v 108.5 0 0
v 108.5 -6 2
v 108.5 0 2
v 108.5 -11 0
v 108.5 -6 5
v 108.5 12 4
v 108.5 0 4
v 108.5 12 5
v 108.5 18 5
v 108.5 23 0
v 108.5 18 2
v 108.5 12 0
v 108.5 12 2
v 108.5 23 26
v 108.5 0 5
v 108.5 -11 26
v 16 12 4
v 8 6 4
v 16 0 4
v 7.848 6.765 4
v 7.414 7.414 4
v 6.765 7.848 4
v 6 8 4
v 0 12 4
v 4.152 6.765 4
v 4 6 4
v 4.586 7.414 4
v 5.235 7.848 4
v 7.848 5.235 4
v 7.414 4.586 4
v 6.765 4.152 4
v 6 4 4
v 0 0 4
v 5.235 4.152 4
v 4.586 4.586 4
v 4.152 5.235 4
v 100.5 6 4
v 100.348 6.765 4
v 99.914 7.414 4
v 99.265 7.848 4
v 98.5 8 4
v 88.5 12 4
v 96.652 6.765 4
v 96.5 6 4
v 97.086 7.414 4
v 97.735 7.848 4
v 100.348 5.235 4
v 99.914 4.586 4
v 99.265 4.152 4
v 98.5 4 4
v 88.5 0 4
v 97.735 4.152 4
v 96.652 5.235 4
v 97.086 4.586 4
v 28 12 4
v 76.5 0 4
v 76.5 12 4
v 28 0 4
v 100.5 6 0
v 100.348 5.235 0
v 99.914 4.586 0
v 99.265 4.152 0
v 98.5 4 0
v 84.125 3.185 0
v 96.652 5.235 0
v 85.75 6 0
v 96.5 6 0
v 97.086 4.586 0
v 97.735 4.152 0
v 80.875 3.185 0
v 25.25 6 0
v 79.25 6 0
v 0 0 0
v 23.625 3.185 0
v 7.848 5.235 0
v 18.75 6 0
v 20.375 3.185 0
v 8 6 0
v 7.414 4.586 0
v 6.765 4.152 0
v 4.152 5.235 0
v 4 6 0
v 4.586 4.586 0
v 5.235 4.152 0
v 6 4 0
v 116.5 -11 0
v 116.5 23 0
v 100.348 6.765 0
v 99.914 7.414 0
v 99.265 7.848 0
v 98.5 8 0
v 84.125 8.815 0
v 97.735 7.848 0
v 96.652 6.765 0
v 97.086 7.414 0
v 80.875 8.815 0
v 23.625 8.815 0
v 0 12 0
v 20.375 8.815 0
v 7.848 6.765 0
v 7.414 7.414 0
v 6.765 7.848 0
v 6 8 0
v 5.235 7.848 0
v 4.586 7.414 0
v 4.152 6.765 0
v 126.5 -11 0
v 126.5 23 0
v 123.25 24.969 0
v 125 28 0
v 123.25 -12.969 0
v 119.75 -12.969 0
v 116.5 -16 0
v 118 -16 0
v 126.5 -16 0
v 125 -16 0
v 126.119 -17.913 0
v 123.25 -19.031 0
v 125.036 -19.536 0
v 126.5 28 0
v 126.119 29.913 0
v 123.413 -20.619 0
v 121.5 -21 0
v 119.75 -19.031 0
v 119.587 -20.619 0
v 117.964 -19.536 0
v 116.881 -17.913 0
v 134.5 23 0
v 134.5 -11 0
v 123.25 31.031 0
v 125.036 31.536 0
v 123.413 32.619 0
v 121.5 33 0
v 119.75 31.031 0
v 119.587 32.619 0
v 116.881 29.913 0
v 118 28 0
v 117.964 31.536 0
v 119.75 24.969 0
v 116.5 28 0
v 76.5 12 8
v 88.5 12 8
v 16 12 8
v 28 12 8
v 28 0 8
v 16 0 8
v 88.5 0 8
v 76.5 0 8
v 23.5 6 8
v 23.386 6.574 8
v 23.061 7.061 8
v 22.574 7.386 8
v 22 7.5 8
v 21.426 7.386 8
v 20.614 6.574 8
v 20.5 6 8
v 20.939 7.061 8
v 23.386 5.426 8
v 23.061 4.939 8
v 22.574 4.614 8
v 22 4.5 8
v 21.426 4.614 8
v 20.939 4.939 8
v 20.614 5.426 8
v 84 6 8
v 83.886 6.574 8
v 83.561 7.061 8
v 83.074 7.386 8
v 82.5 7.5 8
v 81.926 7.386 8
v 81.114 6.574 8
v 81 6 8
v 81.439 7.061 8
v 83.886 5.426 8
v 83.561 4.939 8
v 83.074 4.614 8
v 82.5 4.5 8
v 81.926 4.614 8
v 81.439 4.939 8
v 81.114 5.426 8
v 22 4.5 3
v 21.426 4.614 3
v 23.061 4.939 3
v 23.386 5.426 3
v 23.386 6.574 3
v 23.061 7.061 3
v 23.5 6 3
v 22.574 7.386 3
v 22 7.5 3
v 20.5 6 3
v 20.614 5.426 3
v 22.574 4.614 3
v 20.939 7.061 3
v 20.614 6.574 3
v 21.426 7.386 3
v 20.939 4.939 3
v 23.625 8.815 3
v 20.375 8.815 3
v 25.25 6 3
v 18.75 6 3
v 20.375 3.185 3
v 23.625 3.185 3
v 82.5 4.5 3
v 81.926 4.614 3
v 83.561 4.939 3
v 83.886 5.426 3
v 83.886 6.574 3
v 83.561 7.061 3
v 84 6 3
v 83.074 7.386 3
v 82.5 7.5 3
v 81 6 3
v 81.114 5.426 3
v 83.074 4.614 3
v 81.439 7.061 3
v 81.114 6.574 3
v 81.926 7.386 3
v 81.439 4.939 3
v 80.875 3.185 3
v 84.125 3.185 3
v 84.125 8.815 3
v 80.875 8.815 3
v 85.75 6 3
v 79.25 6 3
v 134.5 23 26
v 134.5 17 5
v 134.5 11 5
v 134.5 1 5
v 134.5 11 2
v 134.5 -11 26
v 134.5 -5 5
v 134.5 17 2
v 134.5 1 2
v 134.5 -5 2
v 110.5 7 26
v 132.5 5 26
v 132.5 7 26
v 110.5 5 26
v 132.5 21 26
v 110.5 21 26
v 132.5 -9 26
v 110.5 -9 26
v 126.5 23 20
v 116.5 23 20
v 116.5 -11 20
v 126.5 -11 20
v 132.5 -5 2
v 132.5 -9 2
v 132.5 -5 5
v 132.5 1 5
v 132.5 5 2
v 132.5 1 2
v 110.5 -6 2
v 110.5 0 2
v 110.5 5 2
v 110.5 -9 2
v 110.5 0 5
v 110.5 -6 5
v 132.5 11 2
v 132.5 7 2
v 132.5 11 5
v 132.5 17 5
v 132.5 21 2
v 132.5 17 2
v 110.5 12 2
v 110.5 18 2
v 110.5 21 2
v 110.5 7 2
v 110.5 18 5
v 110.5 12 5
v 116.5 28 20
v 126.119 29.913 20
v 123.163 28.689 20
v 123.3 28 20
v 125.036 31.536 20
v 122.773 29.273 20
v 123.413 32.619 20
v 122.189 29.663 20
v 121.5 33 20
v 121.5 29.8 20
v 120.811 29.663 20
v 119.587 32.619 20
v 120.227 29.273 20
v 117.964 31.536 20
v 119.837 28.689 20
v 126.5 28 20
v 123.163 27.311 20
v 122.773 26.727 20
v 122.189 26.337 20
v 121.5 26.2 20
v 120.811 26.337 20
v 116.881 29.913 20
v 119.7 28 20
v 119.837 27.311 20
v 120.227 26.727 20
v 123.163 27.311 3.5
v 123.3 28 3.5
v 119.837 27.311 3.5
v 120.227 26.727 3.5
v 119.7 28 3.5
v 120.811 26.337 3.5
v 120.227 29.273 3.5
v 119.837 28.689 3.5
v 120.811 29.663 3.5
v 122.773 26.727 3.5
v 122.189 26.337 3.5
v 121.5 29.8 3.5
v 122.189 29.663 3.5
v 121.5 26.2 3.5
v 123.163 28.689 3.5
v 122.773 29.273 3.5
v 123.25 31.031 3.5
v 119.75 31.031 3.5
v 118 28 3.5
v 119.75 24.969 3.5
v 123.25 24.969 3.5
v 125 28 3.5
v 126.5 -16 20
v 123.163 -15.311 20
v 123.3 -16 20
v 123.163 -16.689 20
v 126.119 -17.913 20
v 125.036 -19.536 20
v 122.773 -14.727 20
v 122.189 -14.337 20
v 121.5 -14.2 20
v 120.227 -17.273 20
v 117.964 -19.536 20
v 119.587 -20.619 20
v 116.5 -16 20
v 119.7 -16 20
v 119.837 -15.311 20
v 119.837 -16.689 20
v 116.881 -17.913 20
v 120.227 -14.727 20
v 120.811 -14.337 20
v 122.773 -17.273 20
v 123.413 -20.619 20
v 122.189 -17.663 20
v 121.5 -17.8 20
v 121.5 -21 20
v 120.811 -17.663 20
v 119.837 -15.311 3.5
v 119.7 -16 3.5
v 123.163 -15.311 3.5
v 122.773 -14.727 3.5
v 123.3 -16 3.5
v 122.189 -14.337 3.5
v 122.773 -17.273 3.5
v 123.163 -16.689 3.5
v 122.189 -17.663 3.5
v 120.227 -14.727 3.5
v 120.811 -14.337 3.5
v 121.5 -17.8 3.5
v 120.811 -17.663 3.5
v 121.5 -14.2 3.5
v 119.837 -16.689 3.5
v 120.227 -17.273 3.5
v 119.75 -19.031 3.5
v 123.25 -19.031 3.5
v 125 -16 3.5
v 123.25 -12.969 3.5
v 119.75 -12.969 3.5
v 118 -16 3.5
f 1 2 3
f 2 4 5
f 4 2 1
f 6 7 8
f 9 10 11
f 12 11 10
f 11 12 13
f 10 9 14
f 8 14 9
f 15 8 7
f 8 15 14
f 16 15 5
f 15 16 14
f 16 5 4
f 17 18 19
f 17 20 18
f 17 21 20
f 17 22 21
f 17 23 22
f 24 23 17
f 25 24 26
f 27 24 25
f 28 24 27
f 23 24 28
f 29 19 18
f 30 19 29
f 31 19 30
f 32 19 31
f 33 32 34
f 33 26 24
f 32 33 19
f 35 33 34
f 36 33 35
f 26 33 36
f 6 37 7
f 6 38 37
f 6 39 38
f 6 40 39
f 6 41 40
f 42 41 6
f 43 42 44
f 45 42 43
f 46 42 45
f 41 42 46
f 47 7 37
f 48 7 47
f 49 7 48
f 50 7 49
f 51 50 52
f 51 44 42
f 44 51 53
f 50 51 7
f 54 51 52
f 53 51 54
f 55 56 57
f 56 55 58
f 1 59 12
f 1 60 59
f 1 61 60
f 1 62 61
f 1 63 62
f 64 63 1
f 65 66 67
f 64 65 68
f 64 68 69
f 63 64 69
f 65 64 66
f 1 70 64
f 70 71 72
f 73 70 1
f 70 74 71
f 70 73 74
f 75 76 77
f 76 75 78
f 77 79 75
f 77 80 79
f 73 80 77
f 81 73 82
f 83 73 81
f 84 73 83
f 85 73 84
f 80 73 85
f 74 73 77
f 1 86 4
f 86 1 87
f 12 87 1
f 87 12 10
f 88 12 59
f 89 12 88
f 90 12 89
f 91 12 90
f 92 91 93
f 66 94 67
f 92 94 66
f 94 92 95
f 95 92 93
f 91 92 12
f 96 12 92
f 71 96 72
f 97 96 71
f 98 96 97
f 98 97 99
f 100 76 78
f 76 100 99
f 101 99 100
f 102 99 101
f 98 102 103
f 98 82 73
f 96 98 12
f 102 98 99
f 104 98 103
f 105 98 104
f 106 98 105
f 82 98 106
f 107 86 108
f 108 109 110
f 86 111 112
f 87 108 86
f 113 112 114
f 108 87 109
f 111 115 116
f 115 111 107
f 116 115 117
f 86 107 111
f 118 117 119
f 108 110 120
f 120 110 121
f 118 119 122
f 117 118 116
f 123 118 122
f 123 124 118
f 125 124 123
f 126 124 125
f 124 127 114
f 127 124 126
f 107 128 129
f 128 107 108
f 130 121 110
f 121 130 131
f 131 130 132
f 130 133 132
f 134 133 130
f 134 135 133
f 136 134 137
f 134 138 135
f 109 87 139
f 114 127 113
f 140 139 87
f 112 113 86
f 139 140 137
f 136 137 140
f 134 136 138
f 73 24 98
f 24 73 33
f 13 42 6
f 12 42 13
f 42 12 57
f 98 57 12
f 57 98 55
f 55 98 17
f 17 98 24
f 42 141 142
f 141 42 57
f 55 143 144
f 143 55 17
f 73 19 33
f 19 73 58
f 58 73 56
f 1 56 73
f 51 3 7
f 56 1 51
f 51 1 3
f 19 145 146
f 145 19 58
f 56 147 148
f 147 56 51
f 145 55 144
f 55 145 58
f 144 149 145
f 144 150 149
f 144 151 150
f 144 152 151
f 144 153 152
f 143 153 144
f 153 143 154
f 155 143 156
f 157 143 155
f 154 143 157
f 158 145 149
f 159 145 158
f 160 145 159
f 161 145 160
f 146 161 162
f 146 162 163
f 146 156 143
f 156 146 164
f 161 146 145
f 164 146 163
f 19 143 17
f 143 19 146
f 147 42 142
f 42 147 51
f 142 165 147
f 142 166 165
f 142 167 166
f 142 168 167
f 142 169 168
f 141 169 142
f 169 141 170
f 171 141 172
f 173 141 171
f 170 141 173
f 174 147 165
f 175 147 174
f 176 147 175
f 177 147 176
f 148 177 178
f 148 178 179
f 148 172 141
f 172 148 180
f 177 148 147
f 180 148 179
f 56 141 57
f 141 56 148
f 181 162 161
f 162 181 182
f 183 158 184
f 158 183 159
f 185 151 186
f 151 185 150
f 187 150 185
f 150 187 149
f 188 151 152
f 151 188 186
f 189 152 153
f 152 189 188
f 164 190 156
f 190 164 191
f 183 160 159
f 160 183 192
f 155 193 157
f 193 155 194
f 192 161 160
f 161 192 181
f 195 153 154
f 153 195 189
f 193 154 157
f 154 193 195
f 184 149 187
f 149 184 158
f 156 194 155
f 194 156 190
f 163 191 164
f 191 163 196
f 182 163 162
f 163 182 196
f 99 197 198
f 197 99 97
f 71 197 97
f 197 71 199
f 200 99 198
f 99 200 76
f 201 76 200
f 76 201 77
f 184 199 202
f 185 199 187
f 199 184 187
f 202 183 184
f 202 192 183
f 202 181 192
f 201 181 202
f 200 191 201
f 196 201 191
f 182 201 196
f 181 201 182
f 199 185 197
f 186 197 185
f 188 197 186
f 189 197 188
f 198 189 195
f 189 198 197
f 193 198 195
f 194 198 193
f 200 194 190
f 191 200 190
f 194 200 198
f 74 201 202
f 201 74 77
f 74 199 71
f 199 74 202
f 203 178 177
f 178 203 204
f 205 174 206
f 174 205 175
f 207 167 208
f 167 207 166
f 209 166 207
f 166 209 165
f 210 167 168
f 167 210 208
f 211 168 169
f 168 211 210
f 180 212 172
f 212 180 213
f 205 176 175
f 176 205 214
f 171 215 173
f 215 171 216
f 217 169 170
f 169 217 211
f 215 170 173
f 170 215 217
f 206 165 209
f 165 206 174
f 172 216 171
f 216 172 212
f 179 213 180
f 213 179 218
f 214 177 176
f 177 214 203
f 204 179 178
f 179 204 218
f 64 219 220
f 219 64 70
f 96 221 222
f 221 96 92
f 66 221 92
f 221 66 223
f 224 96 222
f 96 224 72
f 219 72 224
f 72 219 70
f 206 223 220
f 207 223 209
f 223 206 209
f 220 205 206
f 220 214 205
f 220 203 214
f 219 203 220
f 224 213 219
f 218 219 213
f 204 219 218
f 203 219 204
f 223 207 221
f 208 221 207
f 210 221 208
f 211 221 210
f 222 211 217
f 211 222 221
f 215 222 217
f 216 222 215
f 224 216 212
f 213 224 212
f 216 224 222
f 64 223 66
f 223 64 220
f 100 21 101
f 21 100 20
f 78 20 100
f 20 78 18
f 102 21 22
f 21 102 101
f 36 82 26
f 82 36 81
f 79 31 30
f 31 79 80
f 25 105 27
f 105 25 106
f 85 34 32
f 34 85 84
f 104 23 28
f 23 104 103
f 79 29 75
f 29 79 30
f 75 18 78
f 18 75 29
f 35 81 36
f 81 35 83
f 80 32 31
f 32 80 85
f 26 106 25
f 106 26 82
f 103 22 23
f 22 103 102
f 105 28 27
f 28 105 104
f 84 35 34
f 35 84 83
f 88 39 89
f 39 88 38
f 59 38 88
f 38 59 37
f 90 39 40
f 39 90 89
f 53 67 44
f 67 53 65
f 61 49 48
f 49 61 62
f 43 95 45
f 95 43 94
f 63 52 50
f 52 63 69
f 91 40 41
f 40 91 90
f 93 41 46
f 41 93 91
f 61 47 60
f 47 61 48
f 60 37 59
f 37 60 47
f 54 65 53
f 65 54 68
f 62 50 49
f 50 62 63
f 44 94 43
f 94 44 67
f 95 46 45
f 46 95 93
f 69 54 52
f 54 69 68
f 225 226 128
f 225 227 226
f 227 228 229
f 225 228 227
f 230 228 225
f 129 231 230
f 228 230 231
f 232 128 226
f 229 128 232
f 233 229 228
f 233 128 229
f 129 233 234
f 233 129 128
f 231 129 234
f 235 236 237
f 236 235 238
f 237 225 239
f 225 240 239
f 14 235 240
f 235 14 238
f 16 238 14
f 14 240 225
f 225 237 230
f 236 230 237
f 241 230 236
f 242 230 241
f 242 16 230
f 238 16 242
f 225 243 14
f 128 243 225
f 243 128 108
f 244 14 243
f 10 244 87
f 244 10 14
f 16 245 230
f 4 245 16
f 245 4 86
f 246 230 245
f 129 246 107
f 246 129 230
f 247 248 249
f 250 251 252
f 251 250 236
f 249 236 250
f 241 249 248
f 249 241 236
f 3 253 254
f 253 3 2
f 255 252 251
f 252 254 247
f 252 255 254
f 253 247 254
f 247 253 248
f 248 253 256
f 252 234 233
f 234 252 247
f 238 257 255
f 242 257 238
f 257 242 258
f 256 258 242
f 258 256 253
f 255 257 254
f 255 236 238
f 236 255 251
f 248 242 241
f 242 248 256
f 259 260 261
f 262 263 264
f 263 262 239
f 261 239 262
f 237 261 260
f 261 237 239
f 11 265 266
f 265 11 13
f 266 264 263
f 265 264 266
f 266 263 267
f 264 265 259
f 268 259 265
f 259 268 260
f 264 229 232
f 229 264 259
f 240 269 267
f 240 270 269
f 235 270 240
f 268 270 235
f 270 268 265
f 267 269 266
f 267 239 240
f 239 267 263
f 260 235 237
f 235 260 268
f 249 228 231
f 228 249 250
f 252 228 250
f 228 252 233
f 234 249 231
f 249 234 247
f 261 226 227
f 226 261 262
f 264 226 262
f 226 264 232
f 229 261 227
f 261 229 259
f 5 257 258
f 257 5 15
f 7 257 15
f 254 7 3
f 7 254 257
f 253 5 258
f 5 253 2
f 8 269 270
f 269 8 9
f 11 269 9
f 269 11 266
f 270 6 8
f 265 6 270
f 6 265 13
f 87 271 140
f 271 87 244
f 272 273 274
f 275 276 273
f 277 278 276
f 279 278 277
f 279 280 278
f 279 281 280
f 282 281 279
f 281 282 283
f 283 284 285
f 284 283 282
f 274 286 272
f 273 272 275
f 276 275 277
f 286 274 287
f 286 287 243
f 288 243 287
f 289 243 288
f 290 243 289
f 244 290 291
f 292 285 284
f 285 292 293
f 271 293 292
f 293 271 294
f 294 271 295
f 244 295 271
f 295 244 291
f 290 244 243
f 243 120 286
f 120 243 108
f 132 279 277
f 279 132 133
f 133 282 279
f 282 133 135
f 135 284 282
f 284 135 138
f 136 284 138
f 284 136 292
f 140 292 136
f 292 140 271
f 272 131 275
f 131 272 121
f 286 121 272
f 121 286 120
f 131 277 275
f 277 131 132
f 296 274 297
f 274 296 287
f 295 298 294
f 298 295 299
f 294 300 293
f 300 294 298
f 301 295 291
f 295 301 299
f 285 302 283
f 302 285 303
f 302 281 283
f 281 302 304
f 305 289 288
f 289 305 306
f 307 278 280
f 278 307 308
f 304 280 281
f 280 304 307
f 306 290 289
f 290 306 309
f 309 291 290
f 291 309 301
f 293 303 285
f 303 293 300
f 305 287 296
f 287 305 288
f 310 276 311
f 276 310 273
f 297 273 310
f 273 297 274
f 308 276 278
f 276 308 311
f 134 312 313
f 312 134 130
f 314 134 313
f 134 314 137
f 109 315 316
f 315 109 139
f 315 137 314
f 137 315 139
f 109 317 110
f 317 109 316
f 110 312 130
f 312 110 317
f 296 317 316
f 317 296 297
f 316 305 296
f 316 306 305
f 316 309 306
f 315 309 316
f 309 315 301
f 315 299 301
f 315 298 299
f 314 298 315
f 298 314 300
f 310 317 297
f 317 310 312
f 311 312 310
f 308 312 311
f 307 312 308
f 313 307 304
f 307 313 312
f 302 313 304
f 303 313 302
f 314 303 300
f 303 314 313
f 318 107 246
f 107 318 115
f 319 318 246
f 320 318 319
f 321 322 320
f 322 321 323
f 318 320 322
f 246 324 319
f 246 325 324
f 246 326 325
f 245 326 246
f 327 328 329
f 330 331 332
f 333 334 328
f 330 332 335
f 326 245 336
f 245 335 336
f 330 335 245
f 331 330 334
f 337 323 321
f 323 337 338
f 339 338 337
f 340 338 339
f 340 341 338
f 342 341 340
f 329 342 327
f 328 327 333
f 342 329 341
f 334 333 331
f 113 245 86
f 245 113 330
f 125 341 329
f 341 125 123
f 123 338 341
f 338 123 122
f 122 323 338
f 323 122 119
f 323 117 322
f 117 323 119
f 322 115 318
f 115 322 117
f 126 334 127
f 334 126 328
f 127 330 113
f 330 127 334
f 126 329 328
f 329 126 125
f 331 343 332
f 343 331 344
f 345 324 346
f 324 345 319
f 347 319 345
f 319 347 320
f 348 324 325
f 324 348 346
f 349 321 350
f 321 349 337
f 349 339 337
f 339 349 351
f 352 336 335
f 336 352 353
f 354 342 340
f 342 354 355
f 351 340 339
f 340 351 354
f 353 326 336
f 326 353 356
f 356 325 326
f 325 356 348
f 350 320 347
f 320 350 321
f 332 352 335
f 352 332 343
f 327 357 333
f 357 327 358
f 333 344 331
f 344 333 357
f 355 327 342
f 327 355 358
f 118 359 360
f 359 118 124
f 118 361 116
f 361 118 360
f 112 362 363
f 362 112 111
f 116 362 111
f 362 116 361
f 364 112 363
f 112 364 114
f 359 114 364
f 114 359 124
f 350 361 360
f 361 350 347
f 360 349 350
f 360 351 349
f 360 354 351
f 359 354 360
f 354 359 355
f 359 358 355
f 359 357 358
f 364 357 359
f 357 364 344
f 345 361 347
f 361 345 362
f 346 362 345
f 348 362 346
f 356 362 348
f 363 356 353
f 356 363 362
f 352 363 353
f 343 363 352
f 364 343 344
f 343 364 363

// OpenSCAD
// file: SwitchHolderVars.scad
switchLength=22;
switchWidth=14;

height=24;
thickness=2;

innerLength=switchLength;
innerWidth=2*switchWidth+thickness;

outerLength=innerLength+2*thickness;
outerWidth=innerWidth+2*thickness;
totalHeight=height+thickness;

batteryHolderWidth=12;
batteryHolderThickness=4;
batteryHolderHeight=8;

screwHolderLength=12;
spaceBetweenScrews=60.5;
offsetFromScrews=10;
spaceBetweenSwitch=4;
firstScrewOffset=screwHolderLength+offsetFromScrews-batteryHolderWidth/2;
batteryHolderTotalLength=spaceBetweenScrews+2*offsetFromScrews+2*screwHolderLength+spaceBetweenSwitch;

nutM3HolderDiameter=10;
nutM3HolderRadius=nutM3HolderDiameter/2;
nutM3HolderDifferenceHeight=6;
nutM3HolderHeight=totalHeight-nutM3HolderDifferenceHeight;

wireWidth=6;
wireHeight=3;

//http://g02.a.alicdn.com/kf/UT82xCDXo8XXXagOFbXu/111613040/UT82xCDXo8XXXagOFbXu.jpg
nutM25Diameter=5.45+1.05;
nutM25Height=2+1.0;
screwM25Diameter=3;

nutM3Diameter=6+1;
nutM3Height=2.4+1.1;
screwM3Diameter=3.6;
screwM3HeadDiameter=5+1;
screwM3HeadHeight=3;

screwM4Diameter=4;

// Cover
switchHoleWidth=12.9+0.6;
switchHoleLength=19.2+0.8;

space=0.4;
coverInnerLength=outerLength+2*space;
coverInnerWidth=outerWidth+2*space;
coverOutsideLength=coverInnerLength+2*thickness;
coverOutsideWidth=coverInnerWidth+2*thickness;
coverHeight=2;
coverTotalHeight=thickness+coverHeight;
coverBorder=space+thickness;
coverOutsideScrewHolderHeight=nutM3HolderDifferenceHeight+thickness;
// main file
include<SwitchHolderVars.scad>;

module switchHolder()
{
	translate([batteryHolderTotalLength,batteryHolderWidth/2-outerWidth/2,0])
	difference()
	{
		cube([outerLength,outerWidth,totalHeight]);
		
		translate([thickness,thickness,thickness])
		cube([switchLength,switchWidth,height+1]);
		
		translate([thickness,2*thickness+switchWidth,thickness])
		cube([switchLength,switchWidth,height+1]);
		
		translate([thickness+switchLength-1,thickness+switchWidth/2-wireWidth/2,thickness])
		cube([thickness+2,wireWidth,wireHeight]);
		
		translate([thickness+switchLength-1,2*thickness+3*switchWidth/2-wireWidth/2,thickness])
		cube([thickness+2,wireWidth,wireHeight]);
		
		translate([-1,outerWidth/2-batteryHolderWidth/2-wireWidth,thickness])
		cube([thickness+2,wireWidth,wireHeight]);
		
		translate([-1,outerWidth/2+batteryHolderWidth/2,thickness])
		cube([thickness+2,wireWidth,wireHeight]);
	}
}

module screwM3Holder(bottom)
{
	yTranslate=batteryHolderWidth/2+(bottom?-1:1)*(outerWidth/2+nutM3HolderRadius);
	translate([batteryHolderTotalLength+outerLength/2,yTranslate,0])
	rotate([0,0,bottom?0:180])
	difference()
	{
		union()
		{
			translate([-nutM3HolderRadius,0,0])
			cube([nutM3HolderDiameter,nutM3HolderRadius,nutM3HolderHeight]);
			
			cylinder(d=nutM3HolderDiameter,h=nutM3HolderHeight,$fn=16);
		}
		
		translate([0,0,-1])
		cylinder(d=screwM3Diameter,h=nutM3HolderHeight+2,$fn=16);
		
		translate([0,0,-1])
		cylinder(d=nutM3Diameter,h=nutM3Height+1,$fn=6);
	}
}

module batteryHolder()
{
	difference()
	{
		union()
		{
			cube([batteryHolderTotalLength,batteryHolderWidth,batteryHolderThickness]);
			
			translate([firstScrewOffset,0,0])
			cube([batteryHolderWidth,batteryHolderWidth,batteryHolderHeight]);
			
			translate([firstScrewOffset+spaceBetweenScrews,0,0])
			cube([batteryHolderWidth,batteryHolderWidth,batteryHolderHeight]);
		}
		
		for(t=[0,spaceBetweenScrews])
		{
			x=screwHolderLength+offsetFromScrews+t;
			y=batteryHolderWidth/2;
			
			translate([x,y,-1])
			cylinder(d=screwM25Diameter,h=batteryHolderHeight+2,$fn=16);
			
			translate([x,y,-1])
			cylinder(d=nutM25Diameter,h=nutM25Height+1,$fn=6);
		}
		
		for(x=[screwHolderLength/2,batteryHolderTotalLength-screwHolderLength/2-spaceBetweenSwitch])
		{
			translate([x,batteryHolderWidth/2,-1])
			cylinder(d=screwM4Diameter,h=batteryHolderThickness+2,$fn=16);
		}
	}
}

union()
{
	batteryHolder();
	
	switchHolder();
	
	screwM3Holder(0);
	screwM3Holder(1);
}
